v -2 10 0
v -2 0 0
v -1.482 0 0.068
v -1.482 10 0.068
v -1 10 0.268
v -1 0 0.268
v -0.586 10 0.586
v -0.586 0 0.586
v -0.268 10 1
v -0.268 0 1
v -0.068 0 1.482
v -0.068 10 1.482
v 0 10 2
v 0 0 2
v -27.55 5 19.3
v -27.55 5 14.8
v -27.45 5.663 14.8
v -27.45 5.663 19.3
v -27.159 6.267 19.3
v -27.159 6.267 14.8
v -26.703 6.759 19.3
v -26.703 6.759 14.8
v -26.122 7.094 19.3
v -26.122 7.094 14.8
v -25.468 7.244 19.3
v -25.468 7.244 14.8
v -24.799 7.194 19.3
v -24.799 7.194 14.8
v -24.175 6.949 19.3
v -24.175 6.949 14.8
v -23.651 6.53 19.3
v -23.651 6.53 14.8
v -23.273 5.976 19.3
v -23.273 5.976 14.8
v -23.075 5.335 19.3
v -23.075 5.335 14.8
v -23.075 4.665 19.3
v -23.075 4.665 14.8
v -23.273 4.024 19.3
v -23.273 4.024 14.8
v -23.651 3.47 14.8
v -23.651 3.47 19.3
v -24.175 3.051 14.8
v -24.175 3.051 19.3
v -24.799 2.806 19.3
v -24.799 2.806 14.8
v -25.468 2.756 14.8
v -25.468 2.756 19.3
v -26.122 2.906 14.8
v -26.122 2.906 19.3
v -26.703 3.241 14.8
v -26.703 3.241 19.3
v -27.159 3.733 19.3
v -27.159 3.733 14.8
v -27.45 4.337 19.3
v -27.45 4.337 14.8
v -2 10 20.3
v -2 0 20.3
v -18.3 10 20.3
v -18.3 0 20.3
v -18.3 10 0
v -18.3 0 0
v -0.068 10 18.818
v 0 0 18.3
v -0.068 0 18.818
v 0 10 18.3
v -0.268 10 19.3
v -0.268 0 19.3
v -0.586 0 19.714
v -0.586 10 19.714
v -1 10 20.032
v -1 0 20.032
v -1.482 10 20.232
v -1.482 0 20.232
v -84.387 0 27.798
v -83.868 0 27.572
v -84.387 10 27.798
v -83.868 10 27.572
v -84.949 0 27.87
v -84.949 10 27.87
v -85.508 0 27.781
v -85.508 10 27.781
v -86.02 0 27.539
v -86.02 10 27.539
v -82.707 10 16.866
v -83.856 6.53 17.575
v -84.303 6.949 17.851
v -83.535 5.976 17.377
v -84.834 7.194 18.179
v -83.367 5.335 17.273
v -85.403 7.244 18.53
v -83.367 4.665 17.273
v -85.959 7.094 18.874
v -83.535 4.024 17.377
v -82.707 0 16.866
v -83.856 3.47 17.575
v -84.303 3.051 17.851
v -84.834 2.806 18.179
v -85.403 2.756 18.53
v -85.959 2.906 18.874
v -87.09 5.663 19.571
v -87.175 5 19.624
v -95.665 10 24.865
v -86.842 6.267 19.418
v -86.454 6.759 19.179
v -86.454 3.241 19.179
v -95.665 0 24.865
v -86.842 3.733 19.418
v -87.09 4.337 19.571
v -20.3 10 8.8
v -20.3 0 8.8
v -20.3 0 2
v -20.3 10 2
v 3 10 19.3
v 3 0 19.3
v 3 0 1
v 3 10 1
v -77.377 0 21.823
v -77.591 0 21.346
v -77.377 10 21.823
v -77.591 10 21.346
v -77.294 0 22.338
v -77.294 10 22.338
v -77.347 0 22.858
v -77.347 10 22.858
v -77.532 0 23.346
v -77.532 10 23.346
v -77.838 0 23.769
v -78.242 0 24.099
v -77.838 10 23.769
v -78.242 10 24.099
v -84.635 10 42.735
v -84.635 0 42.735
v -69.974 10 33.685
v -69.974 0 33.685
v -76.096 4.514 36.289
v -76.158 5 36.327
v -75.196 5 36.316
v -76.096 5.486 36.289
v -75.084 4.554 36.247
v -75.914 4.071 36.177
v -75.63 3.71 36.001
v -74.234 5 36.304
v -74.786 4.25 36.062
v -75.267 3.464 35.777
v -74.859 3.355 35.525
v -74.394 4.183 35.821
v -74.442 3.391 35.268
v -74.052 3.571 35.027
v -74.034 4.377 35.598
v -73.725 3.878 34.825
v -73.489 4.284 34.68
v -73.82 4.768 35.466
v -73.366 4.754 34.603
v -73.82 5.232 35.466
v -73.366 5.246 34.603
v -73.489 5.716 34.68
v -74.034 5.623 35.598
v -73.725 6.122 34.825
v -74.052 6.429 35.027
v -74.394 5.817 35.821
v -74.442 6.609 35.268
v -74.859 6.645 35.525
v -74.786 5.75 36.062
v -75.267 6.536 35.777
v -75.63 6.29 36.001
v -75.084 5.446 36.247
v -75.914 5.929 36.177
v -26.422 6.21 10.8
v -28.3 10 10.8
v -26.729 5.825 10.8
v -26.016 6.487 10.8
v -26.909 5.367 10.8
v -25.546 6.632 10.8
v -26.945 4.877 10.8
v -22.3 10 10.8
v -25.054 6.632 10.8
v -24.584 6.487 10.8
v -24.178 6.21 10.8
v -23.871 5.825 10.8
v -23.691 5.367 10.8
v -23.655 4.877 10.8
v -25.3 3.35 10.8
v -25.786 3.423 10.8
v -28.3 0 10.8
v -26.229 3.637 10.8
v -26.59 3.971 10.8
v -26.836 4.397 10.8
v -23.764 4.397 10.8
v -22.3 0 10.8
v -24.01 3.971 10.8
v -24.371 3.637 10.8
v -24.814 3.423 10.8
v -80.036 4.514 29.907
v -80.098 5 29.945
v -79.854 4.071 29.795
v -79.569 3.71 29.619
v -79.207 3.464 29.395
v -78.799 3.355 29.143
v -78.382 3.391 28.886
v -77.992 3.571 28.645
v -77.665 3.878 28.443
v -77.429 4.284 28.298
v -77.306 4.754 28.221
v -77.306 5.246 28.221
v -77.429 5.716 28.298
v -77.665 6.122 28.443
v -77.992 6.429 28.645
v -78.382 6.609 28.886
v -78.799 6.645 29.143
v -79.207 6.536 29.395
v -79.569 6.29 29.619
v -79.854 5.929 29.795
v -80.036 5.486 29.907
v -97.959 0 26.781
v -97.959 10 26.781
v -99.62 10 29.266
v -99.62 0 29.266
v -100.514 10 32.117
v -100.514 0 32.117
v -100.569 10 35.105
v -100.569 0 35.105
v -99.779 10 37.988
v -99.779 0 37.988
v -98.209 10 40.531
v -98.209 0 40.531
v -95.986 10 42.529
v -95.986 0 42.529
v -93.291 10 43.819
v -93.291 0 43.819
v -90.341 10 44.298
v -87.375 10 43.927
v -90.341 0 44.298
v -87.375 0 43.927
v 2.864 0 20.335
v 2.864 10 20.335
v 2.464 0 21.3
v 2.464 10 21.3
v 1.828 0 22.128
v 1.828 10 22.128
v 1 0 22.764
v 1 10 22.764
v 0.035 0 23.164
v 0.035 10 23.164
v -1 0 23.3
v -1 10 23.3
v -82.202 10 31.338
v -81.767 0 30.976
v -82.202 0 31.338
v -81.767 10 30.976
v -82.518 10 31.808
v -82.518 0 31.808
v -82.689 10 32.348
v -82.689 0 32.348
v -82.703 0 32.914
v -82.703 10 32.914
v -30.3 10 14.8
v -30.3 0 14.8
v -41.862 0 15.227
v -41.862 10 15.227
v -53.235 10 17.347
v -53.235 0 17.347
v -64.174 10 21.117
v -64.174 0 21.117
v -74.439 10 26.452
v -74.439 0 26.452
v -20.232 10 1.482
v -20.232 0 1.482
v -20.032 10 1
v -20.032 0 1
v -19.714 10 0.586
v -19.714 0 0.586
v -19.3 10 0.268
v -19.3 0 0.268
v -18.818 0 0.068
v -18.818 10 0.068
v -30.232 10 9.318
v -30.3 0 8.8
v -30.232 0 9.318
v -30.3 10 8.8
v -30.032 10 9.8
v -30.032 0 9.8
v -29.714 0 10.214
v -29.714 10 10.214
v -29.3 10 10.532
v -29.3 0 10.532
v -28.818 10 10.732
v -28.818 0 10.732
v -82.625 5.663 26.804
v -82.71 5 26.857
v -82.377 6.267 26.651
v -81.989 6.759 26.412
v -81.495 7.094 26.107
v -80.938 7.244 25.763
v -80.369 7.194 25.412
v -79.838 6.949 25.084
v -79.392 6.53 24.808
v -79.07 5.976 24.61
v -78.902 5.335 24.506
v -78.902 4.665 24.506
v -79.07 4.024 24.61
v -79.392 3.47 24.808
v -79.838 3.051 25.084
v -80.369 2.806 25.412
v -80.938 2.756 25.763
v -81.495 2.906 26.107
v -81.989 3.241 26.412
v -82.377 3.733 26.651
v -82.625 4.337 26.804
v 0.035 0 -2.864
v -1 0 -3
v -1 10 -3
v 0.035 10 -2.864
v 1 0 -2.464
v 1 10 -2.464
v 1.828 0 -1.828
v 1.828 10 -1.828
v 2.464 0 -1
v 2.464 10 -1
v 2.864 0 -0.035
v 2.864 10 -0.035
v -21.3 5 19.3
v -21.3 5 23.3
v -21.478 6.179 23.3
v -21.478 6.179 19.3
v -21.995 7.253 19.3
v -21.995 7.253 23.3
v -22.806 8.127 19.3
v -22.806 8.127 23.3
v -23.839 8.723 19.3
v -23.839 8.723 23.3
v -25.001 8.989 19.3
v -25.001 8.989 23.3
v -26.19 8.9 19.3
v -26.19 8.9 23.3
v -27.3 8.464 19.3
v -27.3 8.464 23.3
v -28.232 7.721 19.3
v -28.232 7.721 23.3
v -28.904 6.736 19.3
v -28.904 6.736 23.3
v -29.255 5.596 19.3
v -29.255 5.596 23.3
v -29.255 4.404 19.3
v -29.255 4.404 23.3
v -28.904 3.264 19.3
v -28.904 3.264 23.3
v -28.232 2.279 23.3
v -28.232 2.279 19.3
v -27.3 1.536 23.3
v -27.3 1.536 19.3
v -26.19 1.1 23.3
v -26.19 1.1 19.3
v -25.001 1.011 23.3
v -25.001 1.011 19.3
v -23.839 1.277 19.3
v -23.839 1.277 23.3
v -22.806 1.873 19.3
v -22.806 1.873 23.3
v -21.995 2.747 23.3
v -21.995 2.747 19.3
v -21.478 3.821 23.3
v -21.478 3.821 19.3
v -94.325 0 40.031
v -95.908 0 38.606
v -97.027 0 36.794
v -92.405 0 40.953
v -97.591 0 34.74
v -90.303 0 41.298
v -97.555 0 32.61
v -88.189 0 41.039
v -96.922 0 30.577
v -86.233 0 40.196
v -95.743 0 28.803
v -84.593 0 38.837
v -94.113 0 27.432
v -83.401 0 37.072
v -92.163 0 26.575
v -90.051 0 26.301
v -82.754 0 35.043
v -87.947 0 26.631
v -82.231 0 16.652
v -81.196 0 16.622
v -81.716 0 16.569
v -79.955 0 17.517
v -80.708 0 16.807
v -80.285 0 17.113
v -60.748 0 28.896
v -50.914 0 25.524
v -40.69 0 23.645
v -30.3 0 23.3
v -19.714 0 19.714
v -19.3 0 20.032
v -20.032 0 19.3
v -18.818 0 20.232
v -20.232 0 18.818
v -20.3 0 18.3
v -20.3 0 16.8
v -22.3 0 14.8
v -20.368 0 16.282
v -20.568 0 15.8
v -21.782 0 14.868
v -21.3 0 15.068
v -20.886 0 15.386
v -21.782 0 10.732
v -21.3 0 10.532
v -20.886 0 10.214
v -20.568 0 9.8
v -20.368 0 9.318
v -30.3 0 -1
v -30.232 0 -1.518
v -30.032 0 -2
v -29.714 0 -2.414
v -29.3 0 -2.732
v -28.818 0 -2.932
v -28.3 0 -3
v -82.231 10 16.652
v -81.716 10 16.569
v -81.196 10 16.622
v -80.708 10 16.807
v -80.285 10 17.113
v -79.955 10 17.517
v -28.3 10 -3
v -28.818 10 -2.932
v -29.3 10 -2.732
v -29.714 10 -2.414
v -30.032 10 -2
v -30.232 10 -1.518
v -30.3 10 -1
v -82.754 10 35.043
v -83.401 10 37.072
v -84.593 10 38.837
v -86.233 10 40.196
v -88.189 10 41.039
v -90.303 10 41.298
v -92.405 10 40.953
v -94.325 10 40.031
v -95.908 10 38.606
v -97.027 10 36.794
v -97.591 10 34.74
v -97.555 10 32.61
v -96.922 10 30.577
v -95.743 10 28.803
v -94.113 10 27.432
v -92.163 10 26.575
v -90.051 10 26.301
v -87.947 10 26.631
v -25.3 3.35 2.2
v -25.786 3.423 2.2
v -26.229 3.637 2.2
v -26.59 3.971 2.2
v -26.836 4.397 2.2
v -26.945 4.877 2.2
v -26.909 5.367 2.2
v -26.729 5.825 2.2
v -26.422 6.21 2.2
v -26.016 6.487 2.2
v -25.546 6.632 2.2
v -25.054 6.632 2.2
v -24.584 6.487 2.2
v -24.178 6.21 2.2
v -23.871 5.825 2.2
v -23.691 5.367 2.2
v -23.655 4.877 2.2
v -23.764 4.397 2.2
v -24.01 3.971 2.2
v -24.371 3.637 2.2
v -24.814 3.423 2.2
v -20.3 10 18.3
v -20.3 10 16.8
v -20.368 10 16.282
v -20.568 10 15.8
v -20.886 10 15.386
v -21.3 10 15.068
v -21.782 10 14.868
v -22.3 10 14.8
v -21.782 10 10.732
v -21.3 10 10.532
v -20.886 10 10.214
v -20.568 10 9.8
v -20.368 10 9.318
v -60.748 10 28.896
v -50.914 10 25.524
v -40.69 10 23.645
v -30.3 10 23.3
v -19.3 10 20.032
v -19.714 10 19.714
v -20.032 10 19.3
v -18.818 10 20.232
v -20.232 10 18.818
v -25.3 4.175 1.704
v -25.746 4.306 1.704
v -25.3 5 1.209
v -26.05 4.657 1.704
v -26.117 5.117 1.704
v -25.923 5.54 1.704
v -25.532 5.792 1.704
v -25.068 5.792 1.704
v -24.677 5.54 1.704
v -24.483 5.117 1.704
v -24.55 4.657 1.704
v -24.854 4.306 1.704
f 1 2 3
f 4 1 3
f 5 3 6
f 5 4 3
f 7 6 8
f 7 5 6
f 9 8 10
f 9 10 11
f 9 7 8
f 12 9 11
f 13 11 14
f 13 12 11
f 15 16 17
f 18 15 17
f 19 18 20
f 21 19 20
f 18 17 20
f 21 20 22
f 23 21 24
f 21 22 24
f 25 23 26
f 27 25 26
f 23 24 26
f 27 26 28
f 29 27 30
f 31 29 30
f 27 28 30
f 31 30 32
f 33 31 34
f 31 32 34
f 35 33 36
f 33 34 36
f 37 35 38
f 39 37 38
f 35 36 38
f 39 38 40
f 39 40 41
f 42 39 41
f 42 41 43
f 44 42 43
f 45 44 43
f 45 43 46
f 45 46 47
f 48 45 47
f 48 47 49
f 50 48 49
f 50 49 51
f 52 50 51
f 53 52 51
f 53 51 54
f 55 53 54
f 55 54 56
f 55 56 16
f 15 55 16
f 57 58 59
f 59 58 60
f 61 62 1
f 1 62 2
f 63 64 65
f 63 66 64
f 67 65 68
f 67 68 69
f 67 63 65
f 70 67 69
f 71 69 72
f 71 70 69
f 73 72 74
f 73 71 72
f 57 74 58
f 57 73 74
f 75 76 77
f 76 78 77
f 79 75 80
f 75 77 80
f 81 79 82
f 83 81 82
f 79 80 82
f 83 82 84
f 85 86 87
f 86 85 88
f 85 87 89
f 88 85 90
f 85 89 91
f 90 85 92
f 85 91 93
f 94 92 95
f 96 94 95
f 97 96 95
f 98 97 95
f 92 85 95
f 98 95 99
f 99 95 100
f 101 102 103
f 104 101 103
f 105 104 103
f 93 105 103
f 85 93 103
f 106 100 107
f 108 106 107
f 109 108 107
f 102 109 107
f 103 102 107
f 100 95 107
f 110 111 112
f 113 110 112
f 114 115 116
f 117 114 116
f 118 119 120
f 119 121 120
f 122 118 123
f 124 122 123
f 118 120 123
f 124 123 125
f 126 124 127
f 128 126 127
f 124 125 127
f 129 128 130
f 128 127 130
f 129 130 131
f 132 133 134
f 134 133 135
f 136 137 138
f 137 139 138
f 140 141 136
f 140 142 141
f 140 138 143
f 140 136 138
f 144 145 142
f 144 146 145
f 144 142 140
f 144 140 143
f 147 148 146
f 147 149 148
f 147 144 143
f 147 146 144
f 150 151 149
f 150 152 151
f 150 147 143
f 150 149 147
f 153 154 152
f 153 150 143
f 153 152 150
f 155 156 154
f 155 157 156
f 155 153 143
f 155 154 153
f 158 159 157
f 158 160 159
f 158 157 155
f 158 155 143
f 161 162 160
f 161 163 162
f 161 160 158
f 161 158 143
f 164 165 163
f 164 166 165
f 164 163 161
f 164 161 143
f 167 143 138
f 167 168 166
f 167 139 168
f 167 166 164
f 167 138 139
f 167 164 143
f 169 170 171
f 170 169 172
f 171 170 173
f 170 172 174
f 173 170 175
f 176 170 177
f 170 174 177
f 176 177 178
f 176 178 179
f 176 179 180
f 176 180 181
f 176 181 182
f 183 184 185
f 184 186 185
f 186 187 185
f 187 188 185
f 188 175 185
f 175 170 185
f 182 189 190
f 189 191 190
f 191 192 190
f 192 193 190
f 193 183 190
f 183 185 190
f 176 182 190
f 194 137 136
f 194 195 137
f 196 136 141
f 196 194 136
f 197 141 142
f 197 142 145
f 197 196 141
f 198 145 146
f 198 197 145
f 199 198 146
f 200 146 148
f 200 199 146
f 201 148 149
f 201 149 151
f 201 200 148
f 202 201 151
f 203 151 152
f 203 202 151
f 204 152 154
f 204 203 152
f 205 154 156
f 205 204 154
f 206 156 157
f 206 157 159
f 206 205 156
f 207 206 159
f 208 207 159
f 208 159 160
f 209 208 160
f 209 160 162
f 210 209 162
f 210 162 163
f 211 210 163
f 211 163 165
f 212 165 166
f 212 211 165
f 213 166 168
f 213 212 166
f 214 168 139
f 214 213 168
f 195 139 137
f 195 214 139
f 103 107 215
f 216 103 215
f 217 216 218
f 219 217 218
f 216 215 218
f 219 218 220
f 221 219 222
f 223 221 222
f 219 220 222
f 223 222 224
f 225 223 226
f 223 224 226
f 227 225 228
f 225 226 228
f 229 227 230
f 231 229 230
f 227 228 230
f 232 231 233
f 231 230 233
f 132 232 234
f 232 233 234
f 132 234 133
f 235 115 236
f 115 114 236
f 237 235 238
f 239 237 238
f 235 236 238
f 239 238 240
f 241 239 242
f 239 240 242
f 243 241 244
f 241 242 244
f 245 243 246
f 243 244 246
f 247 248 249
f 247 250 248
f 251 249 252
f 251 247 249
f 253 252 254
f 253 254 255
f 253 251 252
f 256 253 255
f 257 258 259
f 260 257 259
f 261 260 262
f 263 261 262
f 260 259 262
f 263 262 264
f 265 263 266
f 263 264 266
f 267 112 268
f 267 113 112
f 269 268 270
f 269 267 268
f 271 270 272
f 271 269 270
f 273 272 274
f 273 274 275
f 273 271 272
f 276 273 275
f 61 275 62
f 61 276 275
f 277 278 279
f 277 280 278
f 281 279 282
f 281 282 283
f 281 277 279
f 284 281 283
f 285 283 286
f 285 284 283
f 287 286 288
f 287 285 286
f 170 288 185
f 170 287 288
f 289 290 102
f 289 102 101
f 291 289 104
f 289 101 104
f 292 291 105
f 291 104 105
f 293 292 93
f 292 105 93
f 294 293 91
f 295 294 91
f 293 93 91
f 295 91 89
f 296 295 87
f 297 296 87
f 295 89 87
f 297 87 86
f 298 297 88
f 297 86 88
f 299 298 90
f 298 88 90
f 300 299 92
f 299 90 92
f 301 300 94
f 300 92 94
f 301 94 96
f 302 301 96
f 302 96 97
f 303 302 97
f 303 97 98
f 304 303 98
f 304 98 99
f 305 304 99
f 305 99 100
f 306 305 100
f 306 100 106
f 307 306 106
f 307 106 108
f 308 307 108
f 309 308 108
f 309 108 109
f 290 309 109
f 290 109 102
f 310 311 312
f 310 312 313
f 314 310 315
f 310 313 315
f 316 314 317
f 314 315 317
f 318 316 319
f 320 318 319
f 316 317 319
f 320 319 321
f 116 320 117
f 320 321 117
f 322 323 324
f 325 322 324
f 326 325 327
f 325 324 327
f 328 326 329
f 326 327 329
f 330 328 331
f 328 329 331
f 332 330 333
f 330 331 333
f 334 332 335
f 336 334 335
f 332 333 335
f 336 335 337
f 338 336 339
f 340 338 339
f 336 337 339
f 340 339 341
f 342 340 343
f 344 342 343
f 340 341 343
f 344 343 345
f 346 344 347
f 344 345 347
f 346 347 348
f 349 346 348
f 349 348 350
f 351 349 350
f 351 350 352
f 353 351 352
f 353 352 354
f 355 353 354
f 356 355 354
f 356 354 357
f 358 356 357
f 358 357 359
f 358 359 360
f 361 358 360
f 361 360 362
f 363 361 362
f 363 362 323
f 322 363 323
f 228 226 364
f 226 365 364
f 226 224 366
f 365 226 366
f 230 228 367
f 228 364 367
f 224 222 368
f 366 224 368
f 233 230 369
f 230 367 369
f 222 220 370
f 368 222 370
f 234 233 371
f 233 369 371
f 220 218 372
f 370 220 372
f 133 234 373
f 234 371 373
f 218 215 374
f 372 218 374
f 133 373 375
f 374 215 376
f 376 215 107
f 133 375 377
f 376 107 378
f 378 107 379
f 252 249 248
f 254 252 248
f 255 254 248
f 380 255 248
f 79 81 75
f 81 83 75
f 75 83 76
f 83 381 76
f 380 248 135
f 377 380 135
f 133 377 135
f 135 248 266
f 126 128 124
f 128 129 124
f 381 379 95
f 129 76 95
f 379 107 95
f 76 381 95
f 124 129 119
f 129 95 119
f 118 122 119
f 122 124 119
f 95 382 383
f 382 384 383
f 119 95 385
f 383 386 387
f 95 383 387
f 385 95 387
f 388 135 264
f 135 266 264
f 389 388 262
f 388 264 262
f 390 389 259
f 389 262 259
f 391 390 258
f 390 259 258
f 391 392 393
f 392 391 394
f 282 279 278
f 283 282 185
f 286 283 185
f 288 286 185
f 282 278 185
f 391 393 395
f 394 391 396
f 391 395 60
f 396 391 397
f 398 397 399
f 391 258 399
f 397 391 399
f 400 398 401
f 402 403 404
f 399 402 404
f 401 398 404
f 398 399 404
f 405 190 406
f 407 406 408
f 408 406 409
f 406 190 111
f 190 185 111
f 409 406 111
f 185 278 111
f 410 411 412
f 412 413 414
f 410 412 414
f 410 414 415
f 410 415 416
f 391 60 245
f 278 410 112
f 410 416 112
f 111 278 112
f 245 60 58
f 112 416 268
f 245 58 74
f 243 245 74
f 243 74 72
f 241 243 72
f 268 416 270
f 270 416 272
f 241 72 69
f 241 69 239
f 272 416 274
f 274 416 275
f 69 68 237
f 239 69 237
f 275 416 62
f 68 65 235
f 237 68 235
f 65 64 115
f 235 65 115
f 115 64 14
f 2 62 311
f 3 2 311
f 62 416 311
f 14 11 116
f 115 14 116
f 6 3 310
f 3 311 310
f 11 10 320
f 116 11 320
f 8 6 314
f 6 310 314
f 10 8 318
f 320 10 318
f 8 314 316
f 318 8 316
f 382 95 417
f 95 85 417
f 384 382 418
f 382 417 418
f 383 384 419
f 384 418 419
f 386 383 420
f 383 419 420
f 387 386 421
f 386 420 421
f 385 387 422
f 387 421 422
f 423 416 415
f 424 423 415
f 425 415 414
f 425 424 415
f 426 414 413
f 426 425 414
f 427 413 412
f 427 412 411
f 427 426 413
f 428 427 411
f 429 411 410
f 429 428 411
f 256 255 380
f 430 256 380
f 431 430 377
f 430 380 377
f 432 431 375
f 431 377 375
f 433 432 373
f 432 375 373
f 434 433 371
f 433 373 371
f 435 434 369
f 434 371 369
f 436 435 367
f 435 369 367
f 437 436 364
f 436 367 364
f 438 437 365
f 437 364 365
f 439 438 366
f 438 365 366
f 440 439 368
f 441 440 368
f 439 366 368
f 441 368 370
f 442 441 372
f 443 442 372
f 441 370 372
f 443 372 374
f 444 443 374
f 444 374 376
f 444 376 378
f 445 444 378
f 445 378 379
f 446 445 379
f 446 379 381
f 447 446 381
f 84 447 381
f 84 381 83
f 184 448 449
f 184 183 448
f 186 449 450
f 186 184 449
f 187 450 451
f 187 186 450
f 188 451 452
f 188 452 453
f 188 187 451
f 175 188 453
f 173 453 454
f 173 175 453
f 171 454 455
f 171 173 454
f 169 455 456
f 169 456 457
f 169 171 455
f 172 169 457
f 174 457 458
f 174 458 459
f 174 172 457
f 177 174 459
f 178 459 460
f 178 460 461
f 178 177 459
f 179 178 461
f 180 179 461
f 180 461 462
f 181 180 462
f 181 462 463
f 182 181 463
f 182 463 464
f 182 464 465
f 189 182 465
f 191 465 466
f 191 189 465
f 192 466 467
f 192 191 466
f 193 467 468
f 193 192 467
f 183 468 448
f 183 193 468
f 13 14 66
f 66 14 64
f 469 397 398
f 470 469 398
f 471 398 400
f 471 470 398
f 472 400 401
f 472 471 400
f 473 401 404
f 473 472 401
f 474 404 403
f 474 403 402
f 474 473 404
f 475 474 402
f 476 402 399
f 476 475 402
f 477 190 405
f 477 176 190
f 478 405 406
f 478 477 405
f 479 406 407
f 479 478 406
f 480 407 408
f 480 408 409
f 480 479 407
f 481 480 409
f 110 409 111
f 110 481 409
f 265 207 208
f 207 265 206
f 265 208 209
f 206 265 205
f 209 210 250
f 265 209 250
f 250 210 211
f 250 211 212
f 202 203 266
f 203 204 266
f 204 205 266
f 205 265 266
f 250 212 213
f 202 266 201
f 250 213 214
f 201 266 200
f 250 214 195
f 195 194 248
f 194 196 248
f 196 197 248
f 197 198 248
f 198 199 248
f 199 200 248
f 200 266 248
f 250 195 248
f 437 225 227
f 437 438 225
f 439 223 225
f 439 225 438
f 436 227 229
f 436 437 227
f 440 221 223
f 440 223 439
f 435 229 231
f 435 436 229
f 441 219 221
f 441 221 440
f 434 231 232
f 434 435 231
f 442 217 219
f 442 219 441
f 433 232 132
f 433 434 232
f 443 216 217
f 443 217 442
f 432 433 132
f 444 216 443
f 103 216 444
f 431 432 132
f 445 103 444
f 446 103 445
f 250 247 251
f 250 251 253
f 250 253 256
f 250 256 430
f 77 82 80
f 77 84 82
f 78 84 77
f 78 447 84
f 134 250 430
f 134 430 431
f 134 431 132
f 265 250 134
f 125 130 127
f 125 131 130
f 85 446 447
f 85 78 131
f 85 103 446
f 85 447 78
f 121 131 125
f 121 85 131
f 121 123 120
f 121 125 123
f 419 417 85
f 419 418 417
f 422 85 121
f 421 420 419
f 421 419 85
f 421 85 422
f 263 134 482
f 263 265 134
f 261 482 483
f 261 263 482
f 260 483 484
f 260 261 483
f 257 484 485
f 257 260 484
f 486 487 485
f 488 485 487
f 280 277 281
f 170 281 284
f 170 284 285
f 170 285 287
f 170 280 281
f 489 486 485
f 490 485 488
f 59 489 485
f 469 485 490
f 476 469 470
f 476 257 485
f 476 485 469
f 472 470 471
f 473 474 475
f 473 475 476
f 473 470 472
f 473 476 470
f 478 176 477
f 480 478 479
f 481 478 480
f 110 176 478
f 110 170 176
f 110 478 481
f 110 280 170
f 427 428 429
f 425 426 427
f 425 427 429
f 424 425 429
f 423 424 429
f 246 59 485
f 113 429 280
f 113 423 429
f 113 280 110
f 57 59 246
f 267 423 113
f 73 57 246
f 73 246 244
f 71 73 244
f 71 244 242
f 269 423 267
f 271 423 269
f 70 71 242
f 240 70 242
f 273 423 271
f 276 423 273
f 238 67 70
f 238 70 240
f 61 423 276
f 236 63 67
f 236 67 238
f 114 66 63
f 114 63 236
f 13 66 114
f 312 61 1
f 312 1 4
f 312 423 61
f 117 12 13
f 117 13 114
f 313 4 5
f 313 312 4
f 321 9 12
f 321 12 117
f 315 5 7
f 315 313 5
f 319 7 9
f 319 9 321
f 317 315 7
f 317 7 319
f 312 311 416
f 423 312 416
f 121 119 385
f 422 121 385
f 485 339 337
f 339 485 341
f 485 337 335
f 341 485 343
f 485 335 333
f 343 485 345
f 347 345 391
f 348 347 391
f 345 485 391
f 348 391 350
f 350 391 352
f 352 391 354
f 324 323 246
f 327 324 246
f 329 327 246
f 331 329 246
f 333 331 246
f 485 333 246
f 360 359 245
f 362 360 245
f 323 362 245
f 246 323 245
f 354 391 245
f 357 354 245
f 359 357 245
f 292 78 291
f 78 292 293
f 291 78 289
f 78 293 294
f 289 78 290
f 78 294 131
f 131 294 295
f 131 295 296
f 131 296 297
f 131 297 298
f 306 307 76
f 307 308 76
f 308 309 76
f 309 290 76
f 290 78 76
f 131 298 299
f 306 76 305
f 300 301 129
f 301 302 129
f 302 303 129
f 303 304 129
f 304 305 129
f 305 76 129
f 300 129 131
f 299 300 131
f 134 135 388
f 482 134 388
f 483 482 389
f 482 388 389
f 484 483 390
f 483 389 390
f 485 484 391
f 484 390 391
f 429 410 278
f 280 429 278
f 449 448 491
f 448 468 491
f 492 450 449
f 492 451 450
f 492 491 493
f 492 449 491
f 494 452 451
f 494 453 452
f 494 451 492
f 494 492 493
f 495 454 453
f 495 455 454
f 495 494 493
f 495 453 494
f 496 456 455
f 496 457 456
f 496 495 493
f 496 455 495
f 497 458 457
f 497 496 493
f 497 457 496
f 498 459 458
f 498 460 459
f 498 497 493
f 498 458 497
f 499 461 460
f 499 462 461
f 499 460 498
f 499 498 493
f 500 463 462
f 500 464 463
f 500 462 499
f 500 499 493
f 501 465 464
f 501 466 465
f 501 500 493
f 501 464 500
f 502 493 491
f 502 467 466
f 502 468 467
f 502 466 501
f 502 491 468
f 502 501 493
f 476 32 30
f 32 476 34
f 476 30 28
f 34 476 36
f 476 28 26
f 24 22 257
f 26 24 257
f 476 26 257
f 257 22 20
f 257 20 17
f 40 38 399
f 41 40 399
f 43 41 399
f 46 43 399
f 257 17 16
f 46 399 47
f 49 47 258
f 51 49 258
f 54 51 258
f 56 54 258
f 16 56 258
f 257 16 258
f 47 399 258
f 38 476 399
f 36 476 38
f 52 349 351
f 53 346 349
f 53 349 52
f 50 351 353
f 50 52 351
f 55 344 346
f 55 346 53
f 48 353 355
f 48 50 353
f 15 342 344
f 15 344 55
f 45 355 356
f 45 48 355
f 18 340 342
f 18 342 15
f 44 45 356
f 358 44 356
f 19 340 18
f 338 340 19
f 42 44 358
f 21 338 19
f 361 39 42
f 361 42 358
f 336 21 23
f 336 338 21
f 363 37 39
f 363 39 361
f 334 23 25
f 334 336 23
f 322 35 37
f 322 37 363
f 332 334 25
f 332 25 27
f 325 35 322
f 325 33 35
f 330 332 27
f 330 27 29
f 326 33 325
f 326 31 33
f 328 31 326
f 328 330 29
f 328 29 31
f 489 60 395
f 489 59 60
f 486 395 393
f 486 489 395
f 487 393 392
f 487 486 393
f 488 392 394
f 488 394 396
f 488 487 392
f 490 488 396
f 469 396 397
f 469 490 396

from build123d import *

# Parameters (mm, degrees)
EXTRUDE_2_DEPTH             = 10
HOLE_WIZARD_M41_D           = 4.5
HOLE_WIZARD_M41_DEPTH       = 8.5
HOLE_WIZARD_M41_CBORE_D     = 8
HOLE_WIZARD_M41_CBORE_DEPTH = 4
HOLE_WIZARD_M41_2_REACH     = 112.256
HOLE_WIZARD_M41_2_BORE_R    = 2.25
FILLET_4_R                  = 4
FILLET_3_R                  = 2


with BuildPart() as part:
    # Эскиз1 → Бобышка-Вытянуть2 (new body)
    with BuildSketch(Plane(origin=(0, 0, 0), x_dir=(1, 0, 0), z_dir=(0, 1, 0))):
        with BuildLine():
            Line((3, 3), (-23.3, 3))
            Line((-23.3, 3), (-30.3, 3))
            Line((-30.3, 3), (-30.3, -10.8))
            Line((-30.3, -10.8), (-20.3, -10.8))
            Line((-20.3, -10.8), (-20.3, 0))
            Line((-20.3, 0), (0, 0))
            Line((0, 0), (0, -20.3))
            Line((0, -20.3), (-20.3, -20.3))
            Line((-20.3, -20.3), (-20.3, -14.8))
            Line((-20.3, -14.8), (-30.3, -14.8))
            ThreePointArc((-30.3, -14.8), (-53.235137158, -17.347468756), (-74.439305098, -26.452048677))
            Line((-74.439305098, -26.452048677), (-82.948576893, -31.704885388))
            ThreePointArc((-82.948576893, -31.704885388), (-96.531953846, -37.739627534), (-85.049711578, -28.30117667))
            Line((-85.049711578, -28.30117667), (-76.540439783, -23.048339959))
            Line((-76.540439783, -23.048339959), (-81.005350987, -15.815458933))
            Line((-81.005350987, -15.815458933), (-95.665478547, -24.865264615))
            ThreePointArc((-95.665478547, -24.865264615), (-99.084735385, -39.315478547), (-84.634521453, -42.734735385))
            Line((-84.634521453, -42.734735385), (-69.974393893, -33.684929703))
            ThreePointArc((-69.974393893, -33.684929703), (-50.914097819, -25.524407087), (-30.3, -23.3))
            Line((-30.3, -23.3), (-23.3, -23.3))
            Line((-23.3, -23.3), (3, -23.3))
            Line((3, -23.3), (3, 3))
        make_face()
    extrude(amount=EXTRUDE_2_DEPTH)

    # Эскиз4 → Отверстие обработанное метчиком M4x0.72 (revolve, cut)
    with BuildSketch(Plane(origin=(-25.3, 5, 10.8), x_dir=(0, -1, 0), z_dir=(1, 0, 0))):
        Polygon((0, 0), (0, 9.591420021), (1.65, 8.6), (1.65, 0), align=None)
    revolve(axis=Axis((-25.3, 5, 17.15), (0, 0, -1)), mode=Mode.SUBTRACT)

    # Эскиз6 → Отверстие обработанное метчиком M4x0.71 (revolve, cut)
    with BuildSketch(Plane(origin=(-78.693940996, 5, 29.078467033), x_dir=(-0.8509271795055905, 0, 0.5252836711517509), z_dir=(0, 1, 0))):
        Polygon((0, 0), (0, 8.491420021), (1.65, 7.5), (1.65, 0), align=None)
    revolve(axis=Axis((-82.029492307, 5, 23.675079443), (0.5252836711517508, 0, 0.8509271795055904)), mode=Mode.SUBTRACT)

    # Hole Wizard M41
    with Locations(Plane(origin=(-25.3, 5, 23.3), x_dir=(1, 0, 0), z_dir=(0, 0, 1))):
        with Locations((0, 0)):
            CounterBoreHole(HOLE_WIZARD_M41_D / 2, HOLE_WIZARD_M41_CBORE_D / 2, HOLE_WIZARD_M41_CBORE_DEPTH, depth=HOLE_WIZARD_M41_DEPTH)

    # Hole Wizard M41 2 bore → Hole Wizard M41 2 (cut, up to next)
    with BuildSketch(Plane(origin=(-15.282069591, 0, -24.756011063), x_dir=(-0.8509271795055892, 0, 0.525283671151753), z_dir=(-0.525283671151753, 0, -0.8509271795055892)), mode=Mode.PRIVATE) as hole_wizard_m41_2_sk1:
        with Locations((82.23725717, 5)):
            Circle(HOLE_WIZARD_M41_2_BORE_R)
    hole_wizard_m41_2_tool1 = extrude(hole_wizard_m41_2_sk1.sketch, amount=-HOLE_WIZARD_M41_2_REACH, mode=Mode.PRIVATE) & part.part
    add(hole_wizard_m41_2_tool1.solids().sort_by_distance((-85.259987, 5, 18.441877))[0], mode=Mode.SUBTRACT)

    # Скругление4
    fillet_4_edges = [part.edges().sort_by_distance(p)[0] for p in [
        (3, 5, -3),
        (3, 5, 23.3),
    ]]
    fillet(fillet_4_edges, radius=FILLET_4_R)

    # Скругление3
    fillet_3_edges = [part.edges().sort_by_distance(p)[0] for p in [
        (0, 5, 0),
        (-20.3, 5, 0),
        (-20.3, 5, 10.8),
        (-30.3, 5, 10.8),
        (-30.3, 5, -3),
        (-81.005350987, 5, 15.815458933),
        (-76.540439783, 5, 23.048339959),
        (-85.049711578, 5, 28.30117667),
        (-82.948576893, 5, 31.704885388),
        (-20.3, 5, 14.8),
        (-20.3, 5, 20.3),
        (0, 5, 20.3),
    ]]
    fillet(fillet_3_edges, radius=FILLET_3_R)


solid = part.part
